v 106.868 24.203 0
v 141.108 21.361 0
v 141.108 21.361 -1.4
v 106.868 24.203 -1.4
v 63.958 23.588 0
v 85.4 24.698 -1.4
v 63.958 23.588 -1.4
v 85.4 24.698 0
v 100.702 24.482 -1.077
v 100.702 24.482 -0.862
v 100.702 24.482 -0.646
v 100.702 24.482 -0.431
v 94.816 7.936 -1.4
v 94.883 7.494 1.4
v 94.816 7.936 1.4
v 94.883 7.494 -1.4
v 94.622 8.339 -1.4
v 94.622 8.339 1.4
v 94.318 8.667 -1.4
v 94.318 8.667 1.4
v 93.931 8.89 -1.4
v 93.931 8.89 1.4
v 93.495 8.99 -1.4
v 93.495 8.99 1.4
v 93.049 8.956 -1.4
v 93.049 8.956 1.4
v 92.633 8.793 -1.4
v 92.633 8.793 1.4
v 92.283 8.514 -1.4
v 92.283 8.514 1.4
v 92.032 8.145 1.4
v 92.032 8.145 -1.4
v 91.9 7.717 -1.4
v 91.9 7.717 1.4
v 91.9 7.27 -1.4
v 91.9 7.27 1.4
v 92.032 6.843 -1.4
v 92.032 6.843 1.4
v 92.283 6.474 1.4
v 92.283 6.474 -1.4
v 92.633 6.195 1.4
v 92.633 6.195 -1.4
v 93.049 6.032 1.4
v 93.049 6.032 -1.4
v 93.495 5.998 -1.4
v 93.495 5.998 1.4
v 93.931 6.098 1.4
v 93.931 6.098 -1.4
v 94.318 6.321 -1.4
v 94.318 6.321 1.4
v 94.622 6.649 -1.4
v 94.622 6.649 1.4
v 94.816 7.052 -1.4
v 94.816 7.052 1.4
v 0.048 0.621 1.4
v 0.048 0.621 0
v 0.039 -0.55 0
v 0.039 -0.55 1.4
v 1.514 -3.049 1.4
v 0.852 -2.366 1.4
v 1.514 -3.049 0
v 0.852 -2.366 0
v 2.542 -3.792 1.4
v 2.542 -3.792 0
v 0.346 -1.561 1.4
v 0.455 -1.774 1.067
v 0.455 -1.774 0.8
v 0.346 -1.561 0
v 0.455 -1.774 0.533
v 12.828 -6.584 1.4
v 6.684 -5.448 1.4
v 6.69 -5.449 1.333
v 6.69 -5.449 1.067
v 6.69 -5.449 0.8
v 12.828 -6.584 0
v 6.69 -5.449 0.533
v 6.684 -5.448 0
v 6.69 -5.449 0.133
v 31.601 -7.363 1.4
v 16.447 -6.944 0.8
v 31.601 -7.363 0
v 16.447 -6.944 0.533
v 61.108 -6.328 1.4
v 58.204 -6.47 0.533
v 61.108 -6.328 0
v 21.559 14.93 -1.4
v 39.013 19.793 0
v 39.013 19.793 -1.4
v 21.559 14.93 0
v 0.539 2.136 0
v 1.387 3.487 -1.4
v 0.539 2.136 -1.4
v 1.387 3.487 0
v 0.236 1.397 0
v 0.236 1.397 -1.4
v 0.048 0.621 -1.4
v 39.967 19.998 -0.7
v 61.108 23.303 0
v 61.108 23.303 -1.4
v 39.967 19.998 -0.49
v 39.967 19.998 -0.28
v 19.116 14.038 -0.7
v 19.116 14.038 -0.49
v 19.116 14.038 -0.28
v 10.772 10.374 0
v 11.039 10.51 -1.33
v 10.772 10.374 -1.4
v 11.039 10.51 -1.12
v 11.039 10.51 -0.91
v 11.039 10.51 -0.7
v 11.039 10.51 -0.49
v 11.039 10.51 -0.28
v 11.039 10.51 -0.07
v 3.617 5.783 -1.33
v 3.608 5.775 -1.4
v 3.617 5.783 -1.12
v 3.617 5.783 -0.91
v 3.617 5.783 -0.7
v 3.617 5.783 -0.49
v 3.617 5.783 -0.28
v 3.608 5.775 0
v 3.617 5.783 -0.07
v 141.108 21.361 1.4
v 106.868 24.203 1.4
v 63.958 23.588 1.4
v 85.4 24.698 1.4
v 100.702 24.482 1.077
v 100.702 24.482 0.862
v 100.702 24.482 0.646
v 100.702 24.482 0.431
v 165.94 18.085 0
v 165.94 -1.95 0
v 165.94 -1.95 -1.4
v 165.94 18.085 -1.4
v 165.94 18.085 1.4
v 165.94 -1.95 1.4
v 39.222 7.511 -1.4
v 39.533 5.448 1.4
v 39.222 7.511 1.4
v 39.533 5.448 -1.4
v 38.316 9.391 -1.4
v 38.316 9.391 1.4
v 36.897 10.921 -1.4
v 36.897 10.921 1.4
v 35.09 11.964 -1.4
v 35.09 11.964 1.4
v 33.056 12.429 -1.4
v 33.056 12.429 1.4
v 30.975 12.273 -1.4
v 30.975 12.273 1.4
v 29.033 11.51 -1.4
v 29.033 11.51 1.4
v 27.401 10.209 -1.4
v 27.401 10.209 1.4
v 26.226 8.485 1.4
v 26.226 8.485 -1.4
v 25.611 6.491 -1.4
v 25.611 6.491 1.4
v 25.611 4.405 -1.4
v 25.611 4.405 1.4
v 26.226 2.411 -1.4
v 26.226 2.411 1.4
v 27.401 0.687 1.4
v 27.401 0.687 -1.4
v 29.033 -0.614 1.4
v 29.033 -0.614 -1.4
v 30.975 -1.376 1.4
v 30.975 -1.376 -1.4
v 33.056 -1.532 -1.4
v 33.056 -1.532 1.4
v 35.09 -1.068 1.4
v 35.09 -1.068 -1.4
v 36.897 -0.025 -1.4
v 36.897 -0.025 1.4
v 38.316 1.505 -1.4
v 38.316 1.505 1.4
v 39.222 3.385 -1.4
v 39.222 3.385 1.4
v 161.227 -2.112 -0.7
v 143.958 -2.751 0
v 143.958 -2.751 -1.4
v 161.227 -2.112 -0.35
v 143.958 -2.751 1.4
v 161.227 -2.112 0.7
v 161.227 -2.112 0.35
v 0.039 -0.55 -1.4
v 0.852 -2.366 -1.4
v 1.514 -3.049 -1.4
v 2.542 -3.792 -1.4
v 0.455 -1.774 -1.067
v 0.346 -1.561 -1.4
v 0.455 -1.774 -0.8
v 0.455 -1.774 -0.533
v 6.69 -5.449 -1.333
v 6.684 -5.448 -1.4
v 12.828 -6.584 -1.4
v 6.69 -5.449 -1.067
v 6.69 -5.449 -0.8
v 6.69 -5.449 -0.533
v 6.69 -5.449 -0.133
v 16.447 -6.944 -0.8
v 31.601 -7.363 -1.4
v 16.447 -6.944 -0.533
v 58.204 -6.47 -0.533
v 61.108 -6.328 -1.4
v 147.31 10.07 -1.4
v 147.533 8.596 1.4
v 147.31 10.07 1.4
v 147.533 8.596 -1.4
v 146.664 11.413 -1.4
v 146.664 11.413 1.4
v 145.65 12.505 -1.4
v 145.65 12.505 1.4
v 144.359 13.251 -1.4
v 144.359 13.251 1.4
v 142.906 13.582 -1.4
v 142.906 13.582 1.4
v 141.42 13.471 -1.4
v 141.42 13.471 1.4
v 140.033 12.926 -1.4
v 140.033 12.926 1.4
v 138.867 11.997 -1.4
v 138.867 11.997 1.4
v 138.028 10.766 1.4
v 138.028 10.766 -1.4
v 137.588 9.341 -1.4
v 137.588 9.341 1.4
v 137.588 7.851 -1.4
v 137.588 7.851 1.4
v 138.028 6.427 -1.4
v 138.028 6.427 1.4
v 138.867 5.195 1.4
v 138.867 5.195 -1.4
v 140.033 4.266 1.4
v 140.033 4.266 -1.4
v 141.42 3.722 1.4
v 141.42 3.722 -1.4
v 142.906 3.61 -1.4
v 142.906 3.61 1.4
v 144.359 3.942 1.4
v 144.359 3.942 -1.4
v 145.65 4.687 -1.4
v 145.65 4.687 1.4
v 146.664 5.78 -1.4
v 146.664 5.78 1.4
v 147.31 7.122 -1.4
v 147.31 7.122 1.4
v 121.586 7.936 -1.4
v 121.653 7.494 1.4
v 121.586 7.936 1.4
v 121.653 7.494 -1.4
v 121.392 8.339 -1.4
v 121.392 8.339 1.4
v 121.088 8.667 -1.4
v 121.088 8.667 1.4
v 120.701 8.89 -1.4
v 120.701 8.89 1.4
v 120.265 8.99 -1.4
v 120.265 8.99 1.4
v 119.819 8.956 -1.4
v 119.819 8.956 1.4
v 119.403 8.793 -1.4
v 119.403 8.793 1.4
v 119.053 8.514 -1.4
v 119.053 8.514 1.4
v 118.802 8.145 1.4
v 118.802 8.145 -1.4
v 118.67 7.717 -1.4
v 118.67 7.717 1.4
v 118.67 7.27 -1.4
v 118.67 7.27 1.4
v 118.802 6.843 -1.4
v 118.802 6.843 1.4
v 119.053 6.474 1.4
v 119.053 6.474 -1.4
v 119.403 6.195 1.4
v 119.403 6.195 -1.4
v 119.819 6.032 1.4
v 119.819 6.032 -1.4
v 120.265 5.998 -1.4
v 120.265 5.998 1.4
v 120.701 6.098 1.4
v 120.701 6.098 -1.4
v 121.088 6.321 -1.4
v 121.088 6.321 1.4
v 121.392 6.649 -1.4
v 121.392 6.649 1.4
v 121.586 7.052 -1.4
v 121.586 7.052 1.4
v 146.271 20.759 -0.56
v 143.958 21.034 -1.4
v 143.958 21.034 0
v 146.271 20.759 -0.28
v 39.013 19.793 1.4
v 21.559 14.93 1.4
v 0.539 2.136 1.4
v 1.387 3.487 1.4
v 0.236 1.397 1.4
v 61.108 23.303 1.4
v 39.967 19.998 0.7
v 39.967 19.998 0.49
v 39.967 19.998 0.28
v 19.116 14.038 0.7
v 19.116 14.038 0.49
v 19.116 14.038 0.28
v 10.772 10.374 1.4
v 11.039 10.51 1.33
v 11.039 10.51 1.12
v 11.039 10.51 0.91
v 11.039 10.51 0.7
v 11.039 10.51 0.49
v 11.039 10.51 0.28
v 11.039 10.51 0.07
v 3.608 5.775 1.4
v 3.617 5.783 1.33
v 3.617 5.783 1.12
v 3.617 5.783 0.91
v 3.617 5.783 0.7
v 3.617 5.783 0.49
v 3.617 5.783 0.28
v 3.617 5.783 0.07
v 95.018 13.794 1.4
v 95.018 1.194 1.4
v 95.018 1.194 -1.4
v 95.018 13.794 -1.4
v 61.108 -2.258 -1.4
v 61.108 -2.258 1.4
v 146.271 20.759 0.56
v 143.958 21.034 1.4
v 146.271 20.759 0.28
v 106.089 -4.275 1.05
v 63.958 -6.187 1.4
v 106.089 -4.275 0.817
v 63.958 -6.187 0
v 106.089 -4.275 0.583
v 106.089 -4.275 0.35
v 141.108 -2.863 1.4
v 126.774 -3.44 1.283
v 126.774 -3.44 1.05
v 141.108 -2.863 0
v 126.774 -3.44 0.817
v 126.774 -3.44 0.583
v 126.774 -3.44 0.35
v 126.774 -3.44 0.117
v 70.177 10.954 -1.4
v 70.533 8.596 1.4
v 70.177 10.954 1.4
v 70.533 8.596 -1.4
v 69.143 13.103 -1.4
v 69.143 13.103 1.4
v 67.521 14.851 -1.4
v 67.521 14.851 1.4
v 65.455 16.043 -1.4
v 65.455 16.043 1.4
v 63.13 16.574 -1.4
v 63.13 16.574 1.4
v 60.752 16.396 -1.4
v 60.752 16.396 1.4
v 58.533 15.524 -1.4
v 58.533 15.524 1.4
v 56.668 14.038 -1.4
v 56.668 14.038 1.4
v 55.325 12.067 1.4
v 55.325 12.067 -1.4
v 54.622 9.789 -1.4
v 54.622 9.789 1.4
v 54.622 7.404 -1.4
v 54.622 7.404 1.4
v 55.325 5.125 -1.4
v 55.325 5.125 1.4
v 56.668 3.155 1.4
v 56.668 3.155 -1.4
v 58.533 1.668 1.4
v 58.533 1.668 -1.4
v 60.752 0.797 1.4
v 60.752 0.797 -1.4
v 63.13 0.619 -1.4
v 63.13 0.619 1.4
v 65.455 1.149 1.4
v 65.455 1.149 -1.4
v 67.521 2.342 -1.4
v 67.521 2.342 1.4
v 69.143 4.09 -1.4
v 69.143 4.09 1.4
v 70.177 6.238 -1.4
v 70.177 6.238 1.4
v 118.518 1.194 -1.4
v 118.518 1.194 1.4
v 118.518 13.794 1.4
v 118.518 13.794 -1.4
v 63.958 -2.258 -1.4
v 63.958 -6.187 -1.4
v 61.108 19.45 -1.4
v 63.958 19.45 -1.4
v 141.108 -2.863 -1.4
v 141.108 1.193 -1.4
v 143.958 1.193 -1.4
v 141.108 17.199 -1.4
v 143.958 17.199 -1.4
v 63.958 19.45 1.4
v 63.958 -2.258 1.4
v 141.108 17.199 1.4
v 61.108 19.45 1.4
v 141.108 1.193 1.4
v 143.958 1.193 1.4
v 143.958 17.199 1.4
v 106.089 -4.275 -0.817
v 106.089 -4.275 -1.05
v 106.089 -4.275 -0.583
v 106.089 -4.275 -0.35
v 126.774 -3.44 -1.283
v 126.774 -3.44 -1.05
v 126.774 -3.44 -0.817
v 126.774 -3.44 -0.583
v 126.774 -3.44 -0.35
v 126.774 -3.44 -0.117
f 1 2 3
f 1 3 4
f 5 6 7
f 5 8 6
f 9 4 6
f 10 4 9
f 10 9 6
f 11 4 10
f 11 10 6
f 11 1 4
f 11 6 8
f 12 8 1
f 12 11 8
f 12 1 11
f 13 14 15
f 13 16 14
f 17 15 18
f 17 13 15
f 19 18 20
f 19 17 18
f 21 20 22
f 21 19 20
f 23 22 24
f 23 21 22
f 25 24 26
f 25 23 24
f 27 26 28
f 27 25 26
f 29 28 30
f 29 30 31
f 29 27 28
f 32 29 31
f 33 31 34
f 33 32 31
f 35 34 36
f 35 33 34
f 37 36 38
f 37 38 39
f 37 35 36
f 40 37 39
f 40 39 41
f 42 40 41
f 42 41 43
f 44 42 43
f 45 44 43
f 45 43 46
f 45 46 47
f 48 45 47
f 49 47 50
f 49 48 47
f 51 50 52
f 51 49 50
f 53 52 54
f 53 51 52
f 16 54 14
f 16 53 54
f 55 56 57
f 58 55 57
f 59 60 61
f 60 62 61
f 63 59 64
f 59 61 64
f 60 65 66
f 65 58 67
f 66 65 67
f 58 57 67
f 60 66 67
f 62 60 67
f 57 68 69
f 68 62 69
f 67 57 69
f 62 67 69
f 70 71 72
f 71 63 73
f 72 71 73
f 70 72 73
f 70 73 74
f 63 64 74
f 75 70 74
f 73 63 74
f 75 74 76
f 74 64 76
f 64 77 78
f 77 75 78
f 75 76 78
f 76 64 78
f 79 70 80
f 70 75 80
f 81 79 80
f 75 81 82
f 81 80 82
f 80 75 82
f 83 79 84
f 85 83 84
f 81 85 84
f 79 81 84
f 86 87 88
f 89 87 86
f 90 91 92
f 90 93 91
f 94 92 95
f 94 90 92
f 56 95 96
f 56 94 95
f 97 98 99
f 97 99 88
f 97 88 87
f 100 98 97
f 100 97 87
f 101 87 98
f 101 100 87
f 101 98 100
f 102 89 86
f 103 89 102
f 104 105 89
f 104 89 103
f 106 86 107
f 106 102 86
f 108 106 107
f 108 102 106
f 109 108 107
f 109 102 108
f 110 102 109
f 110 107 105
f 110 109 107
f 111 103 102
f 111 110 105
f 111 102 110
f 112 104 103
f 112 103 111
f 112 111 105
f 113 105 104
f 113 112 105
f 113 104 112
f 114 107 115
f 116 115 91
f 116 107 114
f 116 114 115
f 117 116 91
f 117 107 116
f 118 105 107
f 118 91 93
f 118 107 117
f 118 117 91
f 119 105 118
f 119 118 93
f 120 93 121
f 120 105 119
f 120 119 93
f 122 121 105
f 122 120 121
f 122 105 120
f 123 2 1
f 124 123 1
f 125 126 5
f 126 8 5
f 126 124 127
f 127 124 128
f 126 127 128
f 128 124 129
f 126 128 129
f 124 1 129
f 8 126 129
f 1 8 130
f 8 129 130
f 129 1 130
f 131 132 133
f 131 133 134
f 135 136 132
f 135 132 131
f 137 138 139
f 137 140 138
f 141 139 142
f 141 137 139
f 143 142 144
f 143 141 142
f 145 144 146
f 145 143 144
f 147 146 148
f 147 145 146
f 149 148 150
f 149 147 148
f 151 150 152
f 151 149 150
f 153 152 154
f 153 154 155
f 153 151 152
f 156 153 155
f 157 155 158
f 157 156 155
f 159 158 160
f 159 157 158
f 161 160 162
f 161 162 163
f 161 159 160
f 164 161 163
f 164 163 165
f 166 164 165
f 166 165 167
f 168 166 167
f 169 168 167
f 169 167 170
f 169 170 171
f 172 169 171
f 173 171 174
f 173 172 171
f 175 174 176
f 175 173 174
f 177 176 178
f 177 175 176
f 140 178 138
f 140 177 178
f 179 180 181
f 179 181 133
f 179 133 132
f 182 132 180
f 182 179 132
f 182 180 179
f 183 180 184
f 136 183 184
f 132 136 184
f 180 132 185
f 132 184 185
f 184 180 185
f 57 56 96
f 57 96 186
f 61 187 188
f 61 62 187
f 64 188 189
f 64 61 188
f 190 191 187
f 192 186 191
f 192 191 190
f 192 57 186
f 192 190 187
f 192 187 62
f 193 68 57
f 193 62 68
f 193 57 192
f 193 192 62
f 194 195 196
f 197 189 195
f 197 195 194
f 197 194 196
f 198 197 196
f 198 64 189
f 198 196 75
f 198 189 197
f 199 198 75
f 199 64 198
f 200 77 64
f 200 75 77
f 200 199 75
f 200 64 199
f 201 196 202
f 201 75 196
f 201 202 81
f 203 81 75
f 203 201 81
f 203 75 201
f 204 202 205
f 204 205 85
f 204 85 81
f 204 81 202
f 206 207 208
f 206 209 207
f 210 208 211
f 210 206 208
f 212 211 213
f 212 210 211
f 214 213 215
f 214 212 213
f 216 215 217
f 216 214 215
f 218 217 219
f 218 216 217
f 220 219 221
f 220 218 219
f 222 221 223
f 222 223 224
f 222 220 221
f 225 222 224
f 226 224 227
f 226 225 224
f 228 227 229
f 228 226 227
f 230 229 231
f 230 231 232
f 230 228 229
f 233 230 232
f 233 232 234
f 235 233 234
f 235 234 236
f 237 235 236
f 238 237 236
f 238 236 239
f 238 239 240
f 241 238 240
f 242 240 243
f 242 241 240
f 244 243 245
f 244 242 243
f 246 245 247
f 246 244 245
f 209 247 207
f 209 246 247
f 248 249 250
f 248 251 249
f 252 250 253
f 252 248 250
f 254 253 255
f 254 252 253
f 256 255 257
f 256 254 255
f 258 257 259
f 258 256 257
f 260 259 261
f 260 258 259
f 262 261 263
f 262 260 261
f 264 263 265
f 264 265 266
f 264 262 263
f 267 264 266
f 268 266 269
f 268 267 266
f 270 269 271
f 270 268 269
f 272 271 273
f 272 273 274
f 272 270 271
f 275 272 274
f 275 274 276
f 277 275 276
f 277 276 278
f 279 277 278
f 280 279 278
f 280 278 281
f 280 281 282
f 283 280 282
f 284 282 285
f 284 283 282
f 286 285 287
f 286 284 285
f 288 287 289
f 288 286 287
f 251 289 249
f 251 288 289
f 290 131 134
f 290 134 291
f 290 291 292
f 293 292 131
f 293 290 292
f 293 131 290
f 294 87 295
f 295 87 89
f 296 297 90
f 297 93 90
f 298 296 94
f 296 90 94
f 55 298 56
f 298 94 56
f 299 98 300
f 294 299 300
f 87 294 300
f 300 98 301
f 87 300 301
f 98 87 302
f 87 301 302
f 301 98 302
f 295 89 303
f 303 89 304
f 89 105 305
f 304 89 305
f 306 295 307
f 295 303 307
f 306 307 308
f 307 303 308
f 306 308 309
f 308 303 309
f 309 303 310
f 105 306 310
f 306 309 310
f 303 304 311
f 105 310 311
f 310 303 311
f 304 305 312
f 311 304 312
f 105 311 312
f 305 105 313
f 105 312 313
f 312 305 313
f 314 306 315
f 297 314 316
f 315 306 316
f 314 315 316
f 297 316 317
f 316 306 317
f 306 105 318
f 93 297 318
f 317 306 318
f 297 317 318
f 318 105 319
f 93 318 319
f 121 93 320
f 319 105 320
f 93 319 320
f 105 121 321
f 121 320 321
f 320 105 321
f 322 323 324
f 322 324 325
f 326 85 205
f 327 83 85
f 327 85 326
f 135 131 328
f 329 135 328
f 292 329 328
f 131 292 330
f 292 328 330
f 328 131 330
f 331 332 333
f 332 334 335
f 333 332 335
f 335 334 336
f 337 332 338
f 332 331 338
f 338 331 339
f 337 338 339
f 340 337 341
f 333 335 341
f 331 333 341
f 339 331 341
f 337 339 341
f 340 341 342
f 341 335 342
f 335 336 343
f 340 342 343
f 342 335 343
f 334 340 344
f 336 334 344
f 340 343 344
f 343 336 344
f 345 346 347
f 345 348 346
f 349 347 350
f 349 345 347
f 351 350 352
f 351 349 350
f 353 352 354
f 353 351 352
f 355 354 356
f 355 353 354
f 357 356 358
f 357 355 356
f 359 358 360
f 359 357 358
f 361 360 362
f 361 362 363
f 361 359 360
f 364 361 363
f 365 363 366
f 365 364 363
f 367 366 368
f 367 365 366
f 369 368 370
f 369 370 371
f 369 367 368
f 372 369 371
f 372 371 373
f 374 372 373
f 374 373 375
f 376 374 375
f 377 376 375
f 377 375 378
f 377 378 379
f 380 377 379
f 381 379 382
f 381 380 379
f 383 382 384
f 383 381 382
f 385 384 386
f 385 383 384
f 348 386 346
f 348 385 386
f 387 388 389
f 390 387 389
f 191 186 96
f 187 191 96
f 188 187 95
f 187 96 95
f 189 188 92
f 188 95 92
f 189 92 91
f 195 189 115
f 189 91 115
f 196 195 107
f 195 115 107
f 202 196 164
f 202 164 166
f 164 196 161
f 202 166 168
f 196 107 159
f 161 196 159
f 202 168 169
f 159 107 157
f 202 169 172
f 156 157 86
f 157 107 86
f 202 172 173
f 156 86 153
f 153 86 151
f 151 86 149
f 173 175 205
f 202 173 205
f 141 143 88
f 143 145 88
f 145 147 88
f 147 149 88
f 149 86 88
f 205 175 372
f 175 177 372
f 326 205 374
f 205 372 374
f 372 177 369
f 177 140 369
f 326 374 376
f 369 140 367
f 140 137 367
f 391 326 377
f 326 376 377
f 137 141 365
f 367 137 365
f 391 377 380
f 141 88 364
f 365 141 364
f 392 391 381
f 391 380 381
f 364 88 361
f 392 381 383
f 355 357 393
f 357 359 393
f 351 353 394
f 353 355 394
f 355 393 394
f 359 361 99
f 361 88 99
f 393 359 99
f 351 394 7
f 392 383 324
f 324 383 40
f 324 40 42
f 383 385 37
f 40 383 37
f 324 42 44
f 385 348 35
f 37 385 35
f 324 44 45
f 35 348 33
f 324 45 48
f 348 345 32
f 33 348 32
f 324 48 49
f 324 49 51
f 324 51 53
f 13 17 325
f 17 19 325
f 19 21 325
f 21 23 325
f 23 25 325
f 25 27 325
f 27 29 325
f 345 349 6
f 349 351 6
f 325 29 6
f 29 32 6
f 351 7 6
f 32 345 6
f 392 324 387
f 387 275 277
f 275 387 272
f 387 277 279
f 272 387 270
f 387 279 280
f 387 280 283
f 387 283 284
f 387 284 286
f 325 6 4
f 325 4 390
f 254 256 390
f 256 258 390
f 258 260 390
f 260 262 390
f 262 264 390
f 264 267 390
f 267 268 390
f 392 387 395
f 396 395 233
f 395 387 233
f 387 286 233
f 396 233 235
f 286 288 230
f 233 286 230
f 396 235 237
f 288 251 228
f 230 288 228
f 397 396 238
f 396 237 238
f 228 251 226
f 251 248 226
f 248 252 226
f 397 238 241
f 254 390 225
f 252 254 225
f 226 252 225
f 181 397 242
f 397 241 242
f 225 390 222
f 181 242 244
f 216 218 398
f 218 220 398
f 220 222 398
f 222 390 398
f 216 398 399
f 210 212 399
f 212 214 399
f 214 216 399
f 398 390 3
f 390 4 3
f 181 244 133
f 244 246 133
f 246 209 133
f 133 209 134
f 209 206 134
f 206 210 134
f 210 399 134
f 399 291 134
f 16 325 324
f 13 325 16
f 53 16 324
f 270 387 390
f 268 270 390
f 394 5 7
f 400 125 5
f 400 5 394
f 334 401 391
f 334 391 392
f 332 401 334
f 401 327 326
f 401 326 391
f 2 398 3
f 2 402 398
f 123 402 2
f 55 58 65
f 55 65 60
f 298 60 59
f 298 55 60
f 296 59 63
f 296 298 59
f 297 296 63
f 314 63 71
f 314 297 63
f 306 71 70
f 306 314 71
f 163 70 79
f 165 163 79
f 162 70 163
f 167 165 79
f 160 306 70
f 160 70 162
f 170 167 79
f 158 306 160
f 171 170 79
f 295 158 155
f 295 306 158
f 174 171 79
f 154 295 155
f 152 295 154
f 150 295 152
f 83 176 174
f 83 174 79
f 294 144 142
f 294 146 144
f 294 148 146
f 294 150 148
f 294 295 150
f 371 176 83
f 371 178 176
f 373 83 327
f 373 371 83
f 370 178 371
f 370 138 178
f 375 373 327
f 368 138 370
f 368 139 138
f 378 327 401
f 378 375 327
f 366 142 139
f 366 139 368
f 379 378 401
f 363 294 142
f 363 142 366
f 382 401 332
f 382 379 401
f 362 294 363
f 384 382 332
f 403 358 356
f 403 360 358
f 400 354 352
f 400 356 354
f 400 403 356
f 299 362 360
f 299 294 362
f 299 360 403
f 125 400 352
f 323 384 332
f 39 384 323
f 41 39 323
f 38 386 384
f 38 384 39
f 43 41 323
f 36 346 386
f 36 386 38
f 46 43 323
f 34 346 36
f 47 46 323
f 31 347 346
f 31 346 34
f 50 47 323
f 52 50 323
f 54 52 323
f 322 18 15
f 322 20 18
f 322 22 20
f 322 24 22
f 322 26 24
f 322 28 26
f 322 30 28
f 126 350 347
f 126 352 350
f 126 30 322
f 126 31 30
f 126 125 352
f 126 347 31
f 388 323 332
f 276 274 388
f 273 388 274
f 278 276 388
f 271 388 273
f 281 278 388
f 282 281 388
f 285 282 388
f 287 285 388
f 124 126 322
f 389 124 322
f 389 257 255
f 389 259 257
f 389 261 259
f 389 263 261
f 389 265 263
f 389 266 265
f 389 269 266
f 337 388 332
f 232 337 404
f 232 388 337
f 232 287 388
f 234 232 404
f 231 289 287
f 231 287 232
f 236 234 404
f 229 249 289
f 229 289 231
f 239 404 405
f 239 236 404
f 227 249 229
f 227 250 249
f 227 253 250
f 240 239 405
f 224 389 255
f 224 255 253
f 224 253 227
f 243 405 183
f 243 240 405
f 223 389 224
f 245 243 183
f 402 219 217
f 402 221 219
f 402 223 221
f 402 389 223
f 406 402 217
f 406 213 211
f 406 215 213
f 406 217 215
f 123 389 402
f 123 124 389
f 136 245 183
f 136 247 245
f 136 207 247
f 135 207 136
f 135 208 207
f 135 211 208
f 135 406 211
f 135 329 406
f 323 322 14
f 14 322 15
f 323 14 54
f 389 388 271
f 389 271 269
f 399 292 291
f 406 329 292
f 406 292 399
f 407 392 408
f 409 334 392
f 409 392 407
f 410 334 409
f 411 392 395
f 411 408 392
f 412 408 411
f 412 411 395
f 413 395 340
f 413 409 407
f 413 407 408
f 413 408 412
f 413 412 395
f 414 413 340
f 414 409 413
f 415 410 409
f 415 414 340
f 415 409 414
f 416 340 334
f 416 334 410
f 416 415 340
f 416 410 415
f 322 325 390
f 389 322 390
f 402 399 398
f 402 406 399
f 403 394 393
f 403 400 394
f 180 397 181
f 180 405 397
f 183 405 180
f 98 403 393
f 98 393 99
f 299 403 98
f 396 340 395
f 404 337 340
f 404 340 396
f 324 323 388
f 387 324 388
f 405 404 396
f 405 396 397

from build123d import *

# Parameters (mm, degrees)
SKETCH_1_R      = 7
SKETCH_1_R_2    = 8
SKETCH_1_R_3    = 1.5
SKETCH_1_W      = 23.5
SKETCH_1_H      = 12.6
SKETCH_1_R_4    = 5
EXTRUDE_1_DEPTH = 1.4


with BuildPart() as part:
    # Эскиз1 → Бобышка-Вытянуть1 (new, symmetric)
    with BuildSketch(Plane.XY):
        with BuildLine():
            Line((63.957619318, 19.450139662), (61.107619318, 19.450139662))
            Line((61.107619318, 19.450139662), (61.107619318, 23.303137173))
            add(Edge.make_bspline(
                [(61.107619318, 23.303137173), (59.917945614, 23.176751945), (56.739740439, 22.81448979), (51.605762688, 22.119065522), (45.744400311, 21.156564432), (39.995857594, 20.03537139), (34.397919842, 18.756316235), (29.010382103, 17.327615608), (23.925798408, 15.771864922), (19.27067884, 14.134269435), (15.179098391, 12.483335438), (11.74047579, 10.895610996), (8.959371869, 9.429577366), (6.76089118, 8.1086032), (5.033709748, 6.924638056), (3.671694933, 5.854229665), (2.592101123, 4.871305369), (1.738175668, 3.952595744), (1.06987083, 3.080946374), (0.57164541, 2.241622103), (0.215773899, 1.430785398), (0.102255581, 0.883241695), (0.047975, 0.621425001)],
                knots=[0.740090669, 0.740090669, 0.740090669, 0.740090669, 0.7539832, 0.77723469, 0.800246382, 0.822950709, 0.845237155, 0.866915896, 0.887662335, 0.906968281, 0.924203157, 0.938878975, 0.950931611, 0.960693484, 0.968646729, 0.975232933, 0.980794744, 0.985583761, 0.989781539, 0.993521313, 0.996902113, 1, 1, 1, 1], degree=3))
            add(Edge.make_bspline(
                [(0.047975, 0.621425001), (0.02271382, 0.373490086), (-0.027820789, -0.122499974), (0.077991212, -0.884434589), (0.34969565, -1.63883807), (0.814331135, -2.365068923), (1.46348078, -3.039275244), (2.290973016, -3.660999469), (3.30592875, -4.23577962), (4.535255619, -4.773674143), (6.029745688, -5.282192164), (7.868981215, -5.765316676), (10.168831391, -6.221716592), (13.075438188, -6.63961873), (16.728115362, -6.992956737), (21.189952096, -7.247345144), (26.399984415, -7.376638848), (32.197398564, -7.376256913), (38.397806759, -7.261436579), (44.857621768, -7.056641358), (51.486543096, -6.786453532), (56.920566709, -6.533358441), (60.139839208, -6.376114839), (61.107619318, -6.32836923)],
                knots=[0, 0, 0, 0, 0.002941446, 0.005884319, 0.00901613, 0.012364547, 0.016007934, 0.020036845, 0.024573728, 0.029783835, 0.03589701, 0.04324044, 0.052275965, 0.063634589, 0.077983176, 0.095698161, 0.116520086, 0.13966073, 0.16431217, 0.18991889, 0.216157201, 0.242837762, 0.254306514, 0.254306514, 0.254306514, 0.254306514], degree=3))
            Line((61.107619318, -6.32836923), (61.107619318, -2.257745247))
            Line((61.107619318, -2.257745247), (63.957619318, -2.257745247))
            Line((63.957619318, -2.257745247), (63.957619318, -6.186566126))
            add(Edge.make_bspline(
                [(63.957619318, -6.186566126), (64.317823095, -6.168514758), (66.969747676, -6.035316313), (71.910772709, -5.784005174), (78.771375576, -5.439680449), (85.610498609, -5.110951246), (92.432107589, -4.804953317), (99.25503119, -4.531981644), (106.097378404, -4.278274658), (112.96921168, -4.00308991), (119.864404254, -3.723176166), (126.773860473, -3.440067276), (133.855552455, -3.151608468), (138.633361552, -2.960411351), (141.107619318, -2.86287629)],
                knots=[0.265564796, 0.265564796, 0.265564796, 0.265564796, 0.269833583, 0.296993022, 0.324123272, 0.351139107, 0.378035509, 0.404946016, 0.431960837, 0.459078395, 0.4863474, 0.51364083, 0.540928595, 0.570237104, 0.570237104, 0.570237104, 0.570237104], degree=3))
            Line((141.107619318, -2.86287629), (141.107619318, 1.193130543))
            Line((141.107619318, 1.193130543), (143.957619318, 1.193130543))
            Line((143.957619318, 1.193130543), (143.957619318, -2.751209627))
            add(Edge.make_bspline(
                [(143.957619318, -2.751209627), (145.13020609, -2.705557458), (148.596084852, -2.571725453), (154.352602411, -2.355626415), (160.507662095, -2.135075484), (164.369425992, -2.00299999), (165.940456932, -1.950382964)],
                knots=[0.581490104, 0.581490104, 0.581490104, 0.581490104, 0.595379569, 0.622543445, 0.64967326, 0.668278692, 0.668278692, 0.668278692, 0.668278692], degree=3))
            Line((165.940456932, -1.950382964), (165.940456932, 7.49391084))
            Line((165.940456932, 7.49391084), (165.940456932, 18.08535451))
            add(Edge.make_bspline(
                [(165.940456932, 18.08535451), (165.930512987, 18.08685322), (163.740114226, 18.416932974), (159.368680729, 19.054501815), (152.821805128, 19.944885603), (147.683892721, 20.591912914), (144.728786809, 20.943344409), (143.957619318, 21.033629847)],
                knots=[0.332761263, 0.332761263, 0.332761263, 0.332761263, 0.332878042, 0.358484538, 0.384061186, 0.409602822, 0.418619192, 0.418619192, 0.418619192, 0.418619192], degree=3))
            Line((143.957619318, 21.033629847), (143.957619318, 17.19883932))
            Line((143.957619318, 17.19883932), (141.107619318, 17.19883932))
            Line((141.107619318, 17.19883932), (141.107619318, 21.360787161))
            add(Edge.make_bspline(
                [(141.107619318, 21.360787161), (140.647203073, 21.412583326), (138.008124909, 21.706530989), (133.19183673, 22.212004255), (126.658683026, 22.825721434), (120.136770918, 23.363973271), (113.62856714, 23.824677329), (107.152732037, 24.200242598), (100.741095693, 24.498399513), (94.411752715, 24.686649771), (88.155917993, 24.740095652), (81.949043055, 24.658849145), (75.780520591, 24.441013809), (69.785413798, 24.089605746), (65.850842722, 23.766532071), (63.957619318, 23.588464287)],
                knots=[0.429723551, 0.429723551, 0.429723551, 0.429723551, 0.435103874, 0.460559416, 0.485959195, 0.51130307, 0.536551515, 0.561723366, 0.586628867, 0.611085431, 0.6352512, 0.659272176, 0.683163753, 0.706922144, 0.729003809, 0.729003809, 0.729003809, 0.729003809], degree=3))
            Line((63.957619318, 23.588464287), (63.957619318, 19.450139662))
        make_face()
        with Locations((32.532619318, 5.448144701)):
            Circle(SKETCH_1_R, mode=Mode.SUBTRACT)
        with Locations((62.532619318, 8.596197208)):
            Circle(SKETCH_1_R_2, mode=Mode.SUBTRACT)
        with Locations((93.383057475, 7.493910357)):
            Circle(SKETCH_1_R_3, mode=Mode.SUBTRACT)
        with Locations((106.768057475, 7.493910357)):
            Rectangle(SKETCH_1_W, SKETCH_1_H, mode=Mode.SUBTRACT)
        with Locations((120.153057475, 7.493910357)):
            Circle(SKETCH_1_R_3, mode=Mode.SUBTRACT)
        with Locations((142.532619318, 8.596197208)):
            Circle(SKETCH_1_R_4, mode=Mode.SUBTRACT)
    extrude(amount=EXTRUDE_1_DEPTH, both=True)


solid = part.part
